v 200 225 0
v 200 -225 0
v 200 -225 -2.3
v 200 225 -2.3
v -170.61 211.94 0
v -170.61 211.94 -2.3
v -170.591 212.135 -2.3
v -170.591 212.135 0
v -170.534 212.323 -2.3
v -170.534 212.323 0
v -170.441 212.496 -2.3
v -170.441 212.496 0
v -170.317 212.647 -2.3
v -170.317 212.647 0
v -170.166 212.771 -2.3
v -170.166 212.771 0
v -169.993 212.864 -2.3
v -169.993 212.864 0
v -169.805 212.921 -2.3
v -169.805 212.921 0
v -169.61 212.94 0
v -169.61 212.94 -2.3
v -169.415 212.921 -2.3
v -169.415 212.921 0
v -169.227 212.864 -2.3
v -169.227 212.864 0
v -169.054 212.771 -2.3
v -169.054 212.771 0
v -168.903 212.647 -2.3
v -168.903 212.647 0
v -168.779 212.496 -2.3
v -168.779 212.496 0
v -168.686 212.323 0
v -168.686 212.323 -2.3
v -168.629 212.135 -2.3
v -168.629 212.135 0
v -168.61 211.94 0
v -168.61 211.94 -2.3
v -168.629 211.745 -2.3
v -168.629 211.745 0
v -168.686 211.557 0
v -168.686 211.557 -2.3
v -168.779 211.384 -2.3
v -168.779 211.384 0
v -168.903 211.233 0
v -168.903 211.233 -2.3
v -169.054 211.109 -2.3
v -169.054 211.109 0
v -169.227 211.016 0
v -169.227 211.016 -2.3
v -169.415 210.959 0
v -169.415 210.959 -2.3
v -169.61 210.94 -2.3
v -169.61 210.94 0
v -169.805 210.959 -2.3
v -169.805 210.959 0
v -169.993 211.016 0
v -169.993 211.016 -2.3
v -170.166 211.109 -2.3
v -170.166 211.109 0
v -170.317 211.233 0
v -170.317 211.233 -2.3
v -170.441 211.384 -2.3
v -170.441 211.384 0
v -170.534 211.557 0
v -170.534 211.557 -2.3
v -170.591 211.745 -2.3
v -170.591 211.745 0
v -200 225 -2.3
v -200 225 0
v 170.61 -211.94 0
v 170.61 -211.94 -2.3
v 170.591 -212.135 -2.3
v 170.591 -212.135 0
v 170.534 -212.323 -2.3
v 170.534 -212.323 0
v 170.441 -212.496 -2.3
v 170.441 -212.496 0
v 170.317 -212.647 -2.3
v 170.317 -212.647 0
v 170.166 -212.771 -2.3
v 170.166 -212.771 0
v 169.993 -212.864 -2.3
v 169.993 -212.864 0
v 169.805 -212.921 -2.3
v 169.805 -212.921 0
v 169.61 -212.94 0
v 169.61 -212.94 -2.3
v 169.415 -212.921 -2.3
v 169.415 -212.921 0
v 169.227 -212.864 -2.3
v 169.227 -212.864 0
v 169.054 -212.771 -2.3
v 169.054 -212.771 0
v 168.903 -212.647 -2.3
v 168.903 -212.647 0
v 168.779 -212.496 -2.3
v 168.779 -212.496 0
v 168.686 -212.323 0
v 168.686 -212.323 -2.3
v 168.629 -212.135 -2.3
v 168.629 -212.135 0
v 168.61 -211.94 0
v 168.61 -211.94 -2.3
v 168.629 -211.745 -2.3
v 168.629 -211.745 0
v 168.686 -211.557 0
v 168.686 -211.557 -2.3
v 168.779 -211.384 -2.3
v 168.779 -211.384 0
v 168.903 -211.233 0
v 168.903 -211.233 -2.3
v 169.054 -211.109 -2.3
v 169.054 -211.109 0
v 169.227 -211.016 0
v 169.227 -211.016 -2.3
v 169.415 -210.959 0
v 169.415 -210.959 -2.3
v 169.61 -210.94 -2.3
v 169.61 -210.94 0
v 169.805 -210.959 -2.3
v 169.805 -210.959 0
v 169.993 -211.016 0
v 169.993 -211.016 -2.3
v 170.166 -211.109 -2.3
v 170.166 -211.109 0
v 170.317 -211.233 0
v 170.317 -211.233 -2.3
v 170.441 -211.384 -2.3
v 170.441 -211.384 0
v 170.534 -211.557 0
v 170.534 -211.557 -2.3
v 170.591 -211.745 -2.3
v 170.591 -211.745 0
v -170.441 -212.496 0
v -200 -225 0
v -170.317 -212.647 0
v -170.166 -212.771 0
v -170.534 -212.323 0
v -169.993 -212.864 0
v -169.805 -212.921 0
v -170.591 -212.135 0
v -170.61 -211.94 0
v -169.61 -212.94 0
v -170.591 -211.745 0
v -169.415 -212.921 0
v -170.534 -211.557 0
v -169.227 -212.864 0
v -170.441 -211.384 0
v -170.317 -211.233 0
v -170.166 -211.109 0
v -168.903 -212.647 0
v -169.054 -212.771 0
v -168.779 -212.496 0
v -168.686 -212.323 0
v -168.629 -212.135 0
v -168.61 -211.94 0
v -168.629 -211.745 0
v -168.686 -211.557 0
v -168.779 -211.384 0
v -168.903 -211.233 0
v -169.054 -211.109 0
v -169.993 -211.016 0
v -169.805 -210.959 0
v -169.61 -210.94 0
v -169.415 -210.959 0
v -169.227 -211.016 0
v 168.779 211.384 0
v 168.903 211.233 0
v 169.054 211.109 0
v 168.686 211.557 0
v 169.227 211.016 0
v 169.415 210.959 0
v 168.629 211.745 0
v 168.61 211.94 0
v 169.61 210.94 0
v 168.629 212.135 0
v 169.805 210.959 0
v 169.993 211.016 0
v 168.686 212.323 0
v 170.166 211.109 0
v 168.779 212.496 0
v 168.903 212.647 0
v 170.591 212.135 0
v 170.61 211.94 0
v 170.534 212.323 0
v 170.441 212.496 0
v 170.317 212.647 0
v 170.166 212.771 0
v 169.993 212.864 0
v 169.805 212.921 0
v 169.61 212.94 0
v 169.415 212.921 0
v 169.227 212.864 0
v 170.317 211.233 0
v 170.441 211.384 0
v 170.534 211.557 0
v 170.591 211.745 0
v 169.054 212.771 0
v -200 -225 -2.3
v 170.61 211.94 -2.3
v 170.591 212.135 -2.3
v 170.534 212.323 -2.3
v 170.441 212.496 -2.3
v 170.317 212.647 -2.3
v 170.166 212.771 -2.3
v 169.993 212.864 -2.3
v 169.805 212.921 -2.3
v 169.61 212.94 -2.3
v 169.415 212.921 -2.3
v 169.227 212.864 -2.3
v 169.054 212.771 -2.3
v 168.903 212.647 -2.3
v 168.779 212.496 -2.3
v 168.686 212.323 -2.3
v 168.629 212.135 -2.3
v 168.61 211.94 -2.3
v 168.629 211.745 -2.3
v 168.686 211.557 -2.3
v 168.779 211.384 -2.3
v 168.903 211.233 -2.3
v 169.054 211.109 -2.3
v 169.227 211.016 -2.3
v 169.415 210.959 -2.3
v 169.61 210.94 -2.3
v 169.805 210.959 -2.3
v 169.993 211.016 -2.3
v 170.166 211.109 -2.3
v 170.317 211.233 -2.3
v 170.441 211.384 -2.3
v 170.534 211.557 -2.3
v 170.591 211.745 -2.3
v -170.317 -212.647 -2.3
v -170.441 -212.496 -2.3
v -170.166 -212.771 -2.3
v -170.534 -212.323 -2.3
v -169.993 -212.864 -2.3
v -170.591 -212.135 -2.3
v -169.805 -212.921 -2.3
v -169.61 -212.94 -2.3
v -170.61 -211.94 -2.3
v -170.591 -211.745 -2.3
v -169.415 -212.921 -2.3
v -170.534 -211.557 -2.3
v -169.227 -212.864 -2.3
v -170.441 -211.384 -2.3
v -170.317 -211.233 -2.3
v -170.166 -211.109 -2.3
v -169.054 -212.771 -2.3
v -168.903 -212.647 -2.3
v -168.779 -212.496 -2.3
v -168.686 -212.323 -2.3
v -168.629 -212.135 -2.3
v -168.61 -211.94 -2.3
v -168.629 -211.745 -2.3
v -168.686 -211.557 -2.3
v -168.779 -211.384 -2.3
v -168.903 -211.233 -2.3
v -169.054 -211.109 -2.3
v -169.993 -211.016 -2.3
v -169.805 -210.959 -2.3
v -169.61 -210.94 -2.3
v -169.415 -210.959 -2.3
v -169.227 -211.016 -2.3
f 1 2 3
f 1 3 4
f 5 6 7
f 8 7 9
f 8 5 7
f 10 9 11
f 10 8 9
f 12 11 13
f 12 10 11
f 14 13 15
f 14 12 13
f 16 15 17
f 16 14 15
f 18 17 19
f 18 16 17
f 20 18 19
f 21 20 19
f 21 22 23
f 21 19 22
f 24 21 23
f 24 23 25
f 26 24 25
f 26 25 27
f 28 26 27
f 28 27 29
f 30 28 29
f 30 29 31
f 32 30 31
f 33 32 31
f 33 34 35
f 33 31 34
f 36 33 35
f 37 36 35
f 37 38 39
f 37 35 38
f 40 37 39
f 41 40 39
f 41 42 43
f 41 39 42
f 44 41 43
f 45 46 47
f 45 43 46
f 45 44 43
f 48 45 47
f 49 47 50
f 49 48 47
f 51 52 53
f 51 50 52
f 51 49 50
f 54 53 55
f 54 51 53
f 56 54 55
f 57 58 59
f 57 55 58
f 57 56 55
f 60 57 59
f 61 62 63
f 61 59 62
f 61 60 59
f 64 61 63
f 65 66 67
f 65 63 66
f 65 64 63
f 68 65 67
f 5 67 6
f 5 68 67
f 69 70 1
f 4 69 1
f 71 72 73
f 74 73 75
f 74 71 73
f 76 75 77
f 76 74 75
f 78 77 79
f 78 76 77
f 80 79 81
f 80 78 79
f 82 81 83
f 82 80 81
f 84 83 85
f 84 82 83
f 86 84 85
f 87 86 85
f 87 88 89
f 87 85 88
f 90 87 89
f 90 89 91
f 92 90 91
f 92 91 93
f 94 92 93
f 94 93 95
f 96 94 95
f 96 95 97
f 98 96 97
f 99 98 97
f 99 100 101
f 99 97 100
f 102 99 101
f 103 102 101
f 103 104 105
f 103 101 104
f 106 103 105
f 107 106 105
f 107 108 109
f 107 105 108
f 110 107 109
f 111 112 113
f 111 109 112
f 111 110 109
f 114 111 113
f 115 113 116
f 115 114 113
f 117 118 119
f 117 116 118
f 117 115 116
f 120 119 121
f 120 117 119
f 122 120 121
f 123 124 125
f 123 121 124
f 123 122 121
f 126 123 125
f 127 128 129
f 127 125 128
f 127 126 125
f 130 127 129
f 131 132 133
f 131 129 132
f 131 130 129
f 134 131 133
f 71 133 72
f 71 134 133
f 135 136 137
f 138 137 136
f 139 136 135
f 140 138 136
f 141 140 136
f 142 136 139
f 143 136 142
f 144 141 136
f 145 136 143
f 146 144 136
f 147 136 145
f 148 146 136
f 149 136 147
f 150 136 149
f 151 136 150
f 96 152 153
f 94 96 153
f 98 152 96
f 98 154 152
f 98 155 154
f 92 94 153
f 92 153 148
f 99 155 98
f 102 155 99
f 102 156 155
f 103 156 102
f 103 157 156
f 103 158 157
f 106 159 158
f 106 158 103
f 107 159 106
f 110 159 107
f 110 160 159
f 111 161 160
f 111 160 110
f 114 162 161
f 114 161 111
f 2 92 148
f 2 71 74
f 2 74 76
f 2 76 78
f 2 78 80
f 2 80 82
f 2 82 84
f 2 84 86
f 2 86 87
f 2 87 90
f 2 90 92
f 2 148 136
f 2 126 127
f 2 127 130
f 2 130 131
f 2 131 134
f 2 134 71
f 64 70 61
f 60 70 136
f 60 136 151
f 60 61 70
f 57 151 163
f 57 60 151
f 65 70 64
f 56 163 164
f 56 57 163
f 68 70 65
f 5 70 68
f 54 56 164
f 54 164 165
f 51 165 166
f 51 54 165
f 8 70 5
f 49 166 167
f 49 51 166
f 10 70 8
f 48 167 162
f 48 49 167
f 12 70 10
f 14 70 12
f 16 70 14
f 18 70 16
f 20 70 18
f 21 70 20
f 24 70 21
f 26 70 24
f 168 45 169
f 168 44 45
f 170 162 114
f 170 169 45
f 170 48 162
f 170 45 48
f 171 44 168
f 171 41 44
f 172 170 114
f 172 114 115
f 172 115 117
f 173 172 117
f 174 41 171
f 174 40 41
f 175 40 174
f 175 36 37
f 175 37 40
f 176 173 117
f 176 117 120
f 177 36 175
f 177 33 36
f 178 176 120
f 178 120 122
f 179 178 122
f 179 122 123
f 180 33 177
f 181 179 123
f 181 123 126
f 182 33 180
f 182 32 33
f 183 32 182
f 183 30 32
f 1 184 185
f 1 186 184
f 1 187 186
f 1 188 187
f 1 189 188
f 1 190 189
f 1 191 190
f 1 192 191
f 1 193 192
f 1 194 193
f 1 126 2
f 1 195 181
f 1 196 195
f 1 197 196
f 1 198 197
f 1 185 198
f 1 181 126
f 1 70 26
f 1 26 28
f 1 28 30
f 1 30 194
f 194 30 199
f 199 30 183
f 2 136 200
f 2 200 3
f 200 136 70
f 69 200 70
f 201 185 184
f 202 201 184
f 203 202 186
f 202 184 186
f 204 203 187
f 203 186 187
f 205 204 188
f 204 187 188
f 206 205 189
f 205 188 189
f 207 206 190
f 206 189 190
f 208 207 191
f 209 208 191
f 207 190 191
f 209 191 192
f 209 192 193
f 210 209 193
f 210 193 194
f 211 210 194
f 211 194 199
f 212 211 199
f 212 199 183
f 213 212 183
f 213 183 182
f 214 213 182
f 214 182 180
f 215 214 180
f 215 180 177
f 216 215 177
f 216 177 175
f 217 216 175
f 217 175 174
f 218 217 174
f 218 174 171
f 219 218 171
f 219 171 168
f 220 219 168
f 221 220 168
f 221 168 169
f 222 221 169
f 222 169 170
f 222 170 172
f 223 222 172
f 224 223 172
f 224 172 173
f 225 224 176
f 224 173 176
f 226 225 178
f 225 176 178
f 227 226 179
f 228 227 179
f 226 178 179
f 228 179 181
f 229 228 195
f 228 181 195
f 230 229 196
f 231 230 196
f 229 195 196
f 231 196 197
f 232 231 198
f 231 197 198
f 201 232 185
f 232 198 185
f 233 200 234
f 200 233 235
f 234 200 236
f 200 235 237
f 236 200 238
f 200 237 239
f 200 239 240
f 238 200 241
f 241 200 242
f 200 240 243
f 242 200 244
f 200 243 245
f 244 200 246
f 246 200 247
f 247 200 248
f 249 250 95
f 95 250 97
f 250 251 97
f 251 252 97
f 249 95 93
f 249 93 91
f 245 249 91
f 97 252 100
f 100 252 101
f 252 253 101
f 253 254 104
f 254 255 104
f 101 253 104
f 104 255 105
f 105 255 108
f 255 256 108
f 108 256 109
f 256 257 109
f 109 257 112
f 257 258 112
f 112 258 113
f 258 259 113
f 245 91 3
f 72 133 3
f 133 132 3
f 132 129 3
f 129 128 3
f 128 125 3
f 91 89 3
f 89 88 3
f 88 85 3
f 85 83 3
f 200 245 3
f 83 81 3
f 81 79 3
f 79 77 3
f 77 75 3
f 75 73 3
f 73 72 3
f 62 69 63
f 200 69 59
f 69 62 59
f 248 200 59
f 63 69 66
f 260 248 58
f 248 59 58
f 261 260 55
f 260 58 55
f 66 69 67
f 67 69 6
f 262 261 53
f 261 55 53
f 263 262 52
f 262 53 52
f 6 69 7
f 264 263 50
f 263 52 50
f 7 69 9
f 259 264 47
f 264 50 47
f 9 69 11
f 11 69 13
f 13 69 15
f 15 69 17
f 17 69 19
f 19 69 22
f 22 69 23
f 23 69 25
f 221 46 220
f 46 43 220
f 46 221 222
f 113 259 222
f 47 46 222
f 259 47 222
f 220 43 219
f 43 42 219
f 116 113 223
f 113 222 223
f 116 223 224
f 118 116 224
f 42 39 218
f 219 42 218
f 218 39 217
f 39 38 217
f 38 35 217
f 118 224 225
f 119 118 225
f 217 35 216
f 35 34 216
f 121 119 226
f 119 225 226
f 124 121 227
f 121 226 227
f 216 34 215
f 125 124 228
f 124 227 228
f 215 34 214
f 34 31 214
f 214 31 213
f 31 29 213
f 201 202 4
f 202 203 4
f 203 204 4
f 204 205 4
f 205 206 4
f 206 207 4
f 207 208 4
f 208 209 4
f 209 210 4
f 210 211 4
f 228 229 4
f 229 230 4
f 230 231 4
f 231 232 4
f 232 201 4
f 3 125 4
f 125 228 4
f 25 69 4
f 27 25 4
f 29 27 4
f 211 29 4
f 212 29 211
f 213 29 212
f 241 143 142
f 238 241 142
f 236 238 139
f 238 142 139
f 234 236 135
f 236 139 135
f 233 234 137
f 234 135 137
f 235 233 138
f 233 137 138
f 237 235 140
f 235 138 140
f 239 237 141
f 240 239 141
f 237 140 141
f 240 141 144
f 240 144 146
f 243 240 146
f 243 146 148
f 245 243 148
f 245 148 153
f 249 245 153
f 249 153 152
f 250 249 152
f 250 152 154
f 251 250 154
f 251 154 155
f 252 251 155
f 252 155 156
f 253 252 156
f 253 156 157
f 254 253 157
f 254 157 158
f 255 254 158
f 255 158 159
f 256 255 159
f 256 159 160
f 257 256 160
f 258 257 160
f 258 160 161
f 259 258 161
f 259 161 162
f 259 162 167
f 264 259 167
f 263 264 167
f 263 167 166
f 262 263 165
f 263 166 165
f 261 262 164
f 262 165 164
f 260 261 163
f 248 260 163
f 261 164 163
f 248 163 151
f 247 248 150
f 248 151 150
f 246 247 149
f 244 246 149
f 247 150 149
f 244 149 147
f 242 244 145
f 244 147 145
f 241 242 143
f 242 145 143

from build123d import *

# Parameters (mm, degrees)
SKETCH1_W               = 400
SKETCH1_H               = 450
BASE_FLANGE1_DEPTH      = 2.3
SKETCH5_R               = 1
CUT_EXTRUDE4_DEPTH      = 302.048650553
MIRROR4_COPY_1_SKETCH_R = 1
MIRROR4_COPY_1_DEPTH    = 302.048650553


# Sheet-metal steps are written as plain solids
with BuildPart() as part:
    # Sketch1 → Base-Flange1 (new body)
    with BuildSketch(Plane.XY):
        Rectangle(SKETCH1_W, SKETCH1_H)
    extrude(amount=-BASE_FLANGE1_DEPTH)

    # Sketch5 → Cut-Extrude4 (cut, through all)
    with BuildSketch(Plane.XY):
        with Locations((169.61, 211.94)):
            Circle(SKETCH5_R)
    cut_extrude4 = extrude(amount=-CUT_EXTRUDE4_DEPTH, mode=Mode.SUBTRACT)

    # Mirror3: Cut-Extrude4 across plane
    add(cut_extrude4.mirror(Plane.ZX), mode=Mode.SUBTRACT)

    # Mirror4: Cut-Extrude4 across plane
    add(cut_extrude4.mirror(Plane(origin=(0, 0, 0), x_dir=(0, 0, 1), z_dir=(1, 0, 0))), mode=Mode.SUBTRACT)

    # Mirror4 copy 1 sketch → Mirror4 copy 1 (cut, through all)
    with BuildSketch(Plane(origin=(0, 0, 0), x_dir=(-1, 0, 0), z_dir=(0, 0, 1))):
        with Locations((169.61, 211.94)):
            Circle(MIRROR4_COPY_1_SKETCH_R)
    extrude(amount=-MIRROR4_COPY_1_DEPTH, mode=Mode.SUBTRACT)


solid = part.part
